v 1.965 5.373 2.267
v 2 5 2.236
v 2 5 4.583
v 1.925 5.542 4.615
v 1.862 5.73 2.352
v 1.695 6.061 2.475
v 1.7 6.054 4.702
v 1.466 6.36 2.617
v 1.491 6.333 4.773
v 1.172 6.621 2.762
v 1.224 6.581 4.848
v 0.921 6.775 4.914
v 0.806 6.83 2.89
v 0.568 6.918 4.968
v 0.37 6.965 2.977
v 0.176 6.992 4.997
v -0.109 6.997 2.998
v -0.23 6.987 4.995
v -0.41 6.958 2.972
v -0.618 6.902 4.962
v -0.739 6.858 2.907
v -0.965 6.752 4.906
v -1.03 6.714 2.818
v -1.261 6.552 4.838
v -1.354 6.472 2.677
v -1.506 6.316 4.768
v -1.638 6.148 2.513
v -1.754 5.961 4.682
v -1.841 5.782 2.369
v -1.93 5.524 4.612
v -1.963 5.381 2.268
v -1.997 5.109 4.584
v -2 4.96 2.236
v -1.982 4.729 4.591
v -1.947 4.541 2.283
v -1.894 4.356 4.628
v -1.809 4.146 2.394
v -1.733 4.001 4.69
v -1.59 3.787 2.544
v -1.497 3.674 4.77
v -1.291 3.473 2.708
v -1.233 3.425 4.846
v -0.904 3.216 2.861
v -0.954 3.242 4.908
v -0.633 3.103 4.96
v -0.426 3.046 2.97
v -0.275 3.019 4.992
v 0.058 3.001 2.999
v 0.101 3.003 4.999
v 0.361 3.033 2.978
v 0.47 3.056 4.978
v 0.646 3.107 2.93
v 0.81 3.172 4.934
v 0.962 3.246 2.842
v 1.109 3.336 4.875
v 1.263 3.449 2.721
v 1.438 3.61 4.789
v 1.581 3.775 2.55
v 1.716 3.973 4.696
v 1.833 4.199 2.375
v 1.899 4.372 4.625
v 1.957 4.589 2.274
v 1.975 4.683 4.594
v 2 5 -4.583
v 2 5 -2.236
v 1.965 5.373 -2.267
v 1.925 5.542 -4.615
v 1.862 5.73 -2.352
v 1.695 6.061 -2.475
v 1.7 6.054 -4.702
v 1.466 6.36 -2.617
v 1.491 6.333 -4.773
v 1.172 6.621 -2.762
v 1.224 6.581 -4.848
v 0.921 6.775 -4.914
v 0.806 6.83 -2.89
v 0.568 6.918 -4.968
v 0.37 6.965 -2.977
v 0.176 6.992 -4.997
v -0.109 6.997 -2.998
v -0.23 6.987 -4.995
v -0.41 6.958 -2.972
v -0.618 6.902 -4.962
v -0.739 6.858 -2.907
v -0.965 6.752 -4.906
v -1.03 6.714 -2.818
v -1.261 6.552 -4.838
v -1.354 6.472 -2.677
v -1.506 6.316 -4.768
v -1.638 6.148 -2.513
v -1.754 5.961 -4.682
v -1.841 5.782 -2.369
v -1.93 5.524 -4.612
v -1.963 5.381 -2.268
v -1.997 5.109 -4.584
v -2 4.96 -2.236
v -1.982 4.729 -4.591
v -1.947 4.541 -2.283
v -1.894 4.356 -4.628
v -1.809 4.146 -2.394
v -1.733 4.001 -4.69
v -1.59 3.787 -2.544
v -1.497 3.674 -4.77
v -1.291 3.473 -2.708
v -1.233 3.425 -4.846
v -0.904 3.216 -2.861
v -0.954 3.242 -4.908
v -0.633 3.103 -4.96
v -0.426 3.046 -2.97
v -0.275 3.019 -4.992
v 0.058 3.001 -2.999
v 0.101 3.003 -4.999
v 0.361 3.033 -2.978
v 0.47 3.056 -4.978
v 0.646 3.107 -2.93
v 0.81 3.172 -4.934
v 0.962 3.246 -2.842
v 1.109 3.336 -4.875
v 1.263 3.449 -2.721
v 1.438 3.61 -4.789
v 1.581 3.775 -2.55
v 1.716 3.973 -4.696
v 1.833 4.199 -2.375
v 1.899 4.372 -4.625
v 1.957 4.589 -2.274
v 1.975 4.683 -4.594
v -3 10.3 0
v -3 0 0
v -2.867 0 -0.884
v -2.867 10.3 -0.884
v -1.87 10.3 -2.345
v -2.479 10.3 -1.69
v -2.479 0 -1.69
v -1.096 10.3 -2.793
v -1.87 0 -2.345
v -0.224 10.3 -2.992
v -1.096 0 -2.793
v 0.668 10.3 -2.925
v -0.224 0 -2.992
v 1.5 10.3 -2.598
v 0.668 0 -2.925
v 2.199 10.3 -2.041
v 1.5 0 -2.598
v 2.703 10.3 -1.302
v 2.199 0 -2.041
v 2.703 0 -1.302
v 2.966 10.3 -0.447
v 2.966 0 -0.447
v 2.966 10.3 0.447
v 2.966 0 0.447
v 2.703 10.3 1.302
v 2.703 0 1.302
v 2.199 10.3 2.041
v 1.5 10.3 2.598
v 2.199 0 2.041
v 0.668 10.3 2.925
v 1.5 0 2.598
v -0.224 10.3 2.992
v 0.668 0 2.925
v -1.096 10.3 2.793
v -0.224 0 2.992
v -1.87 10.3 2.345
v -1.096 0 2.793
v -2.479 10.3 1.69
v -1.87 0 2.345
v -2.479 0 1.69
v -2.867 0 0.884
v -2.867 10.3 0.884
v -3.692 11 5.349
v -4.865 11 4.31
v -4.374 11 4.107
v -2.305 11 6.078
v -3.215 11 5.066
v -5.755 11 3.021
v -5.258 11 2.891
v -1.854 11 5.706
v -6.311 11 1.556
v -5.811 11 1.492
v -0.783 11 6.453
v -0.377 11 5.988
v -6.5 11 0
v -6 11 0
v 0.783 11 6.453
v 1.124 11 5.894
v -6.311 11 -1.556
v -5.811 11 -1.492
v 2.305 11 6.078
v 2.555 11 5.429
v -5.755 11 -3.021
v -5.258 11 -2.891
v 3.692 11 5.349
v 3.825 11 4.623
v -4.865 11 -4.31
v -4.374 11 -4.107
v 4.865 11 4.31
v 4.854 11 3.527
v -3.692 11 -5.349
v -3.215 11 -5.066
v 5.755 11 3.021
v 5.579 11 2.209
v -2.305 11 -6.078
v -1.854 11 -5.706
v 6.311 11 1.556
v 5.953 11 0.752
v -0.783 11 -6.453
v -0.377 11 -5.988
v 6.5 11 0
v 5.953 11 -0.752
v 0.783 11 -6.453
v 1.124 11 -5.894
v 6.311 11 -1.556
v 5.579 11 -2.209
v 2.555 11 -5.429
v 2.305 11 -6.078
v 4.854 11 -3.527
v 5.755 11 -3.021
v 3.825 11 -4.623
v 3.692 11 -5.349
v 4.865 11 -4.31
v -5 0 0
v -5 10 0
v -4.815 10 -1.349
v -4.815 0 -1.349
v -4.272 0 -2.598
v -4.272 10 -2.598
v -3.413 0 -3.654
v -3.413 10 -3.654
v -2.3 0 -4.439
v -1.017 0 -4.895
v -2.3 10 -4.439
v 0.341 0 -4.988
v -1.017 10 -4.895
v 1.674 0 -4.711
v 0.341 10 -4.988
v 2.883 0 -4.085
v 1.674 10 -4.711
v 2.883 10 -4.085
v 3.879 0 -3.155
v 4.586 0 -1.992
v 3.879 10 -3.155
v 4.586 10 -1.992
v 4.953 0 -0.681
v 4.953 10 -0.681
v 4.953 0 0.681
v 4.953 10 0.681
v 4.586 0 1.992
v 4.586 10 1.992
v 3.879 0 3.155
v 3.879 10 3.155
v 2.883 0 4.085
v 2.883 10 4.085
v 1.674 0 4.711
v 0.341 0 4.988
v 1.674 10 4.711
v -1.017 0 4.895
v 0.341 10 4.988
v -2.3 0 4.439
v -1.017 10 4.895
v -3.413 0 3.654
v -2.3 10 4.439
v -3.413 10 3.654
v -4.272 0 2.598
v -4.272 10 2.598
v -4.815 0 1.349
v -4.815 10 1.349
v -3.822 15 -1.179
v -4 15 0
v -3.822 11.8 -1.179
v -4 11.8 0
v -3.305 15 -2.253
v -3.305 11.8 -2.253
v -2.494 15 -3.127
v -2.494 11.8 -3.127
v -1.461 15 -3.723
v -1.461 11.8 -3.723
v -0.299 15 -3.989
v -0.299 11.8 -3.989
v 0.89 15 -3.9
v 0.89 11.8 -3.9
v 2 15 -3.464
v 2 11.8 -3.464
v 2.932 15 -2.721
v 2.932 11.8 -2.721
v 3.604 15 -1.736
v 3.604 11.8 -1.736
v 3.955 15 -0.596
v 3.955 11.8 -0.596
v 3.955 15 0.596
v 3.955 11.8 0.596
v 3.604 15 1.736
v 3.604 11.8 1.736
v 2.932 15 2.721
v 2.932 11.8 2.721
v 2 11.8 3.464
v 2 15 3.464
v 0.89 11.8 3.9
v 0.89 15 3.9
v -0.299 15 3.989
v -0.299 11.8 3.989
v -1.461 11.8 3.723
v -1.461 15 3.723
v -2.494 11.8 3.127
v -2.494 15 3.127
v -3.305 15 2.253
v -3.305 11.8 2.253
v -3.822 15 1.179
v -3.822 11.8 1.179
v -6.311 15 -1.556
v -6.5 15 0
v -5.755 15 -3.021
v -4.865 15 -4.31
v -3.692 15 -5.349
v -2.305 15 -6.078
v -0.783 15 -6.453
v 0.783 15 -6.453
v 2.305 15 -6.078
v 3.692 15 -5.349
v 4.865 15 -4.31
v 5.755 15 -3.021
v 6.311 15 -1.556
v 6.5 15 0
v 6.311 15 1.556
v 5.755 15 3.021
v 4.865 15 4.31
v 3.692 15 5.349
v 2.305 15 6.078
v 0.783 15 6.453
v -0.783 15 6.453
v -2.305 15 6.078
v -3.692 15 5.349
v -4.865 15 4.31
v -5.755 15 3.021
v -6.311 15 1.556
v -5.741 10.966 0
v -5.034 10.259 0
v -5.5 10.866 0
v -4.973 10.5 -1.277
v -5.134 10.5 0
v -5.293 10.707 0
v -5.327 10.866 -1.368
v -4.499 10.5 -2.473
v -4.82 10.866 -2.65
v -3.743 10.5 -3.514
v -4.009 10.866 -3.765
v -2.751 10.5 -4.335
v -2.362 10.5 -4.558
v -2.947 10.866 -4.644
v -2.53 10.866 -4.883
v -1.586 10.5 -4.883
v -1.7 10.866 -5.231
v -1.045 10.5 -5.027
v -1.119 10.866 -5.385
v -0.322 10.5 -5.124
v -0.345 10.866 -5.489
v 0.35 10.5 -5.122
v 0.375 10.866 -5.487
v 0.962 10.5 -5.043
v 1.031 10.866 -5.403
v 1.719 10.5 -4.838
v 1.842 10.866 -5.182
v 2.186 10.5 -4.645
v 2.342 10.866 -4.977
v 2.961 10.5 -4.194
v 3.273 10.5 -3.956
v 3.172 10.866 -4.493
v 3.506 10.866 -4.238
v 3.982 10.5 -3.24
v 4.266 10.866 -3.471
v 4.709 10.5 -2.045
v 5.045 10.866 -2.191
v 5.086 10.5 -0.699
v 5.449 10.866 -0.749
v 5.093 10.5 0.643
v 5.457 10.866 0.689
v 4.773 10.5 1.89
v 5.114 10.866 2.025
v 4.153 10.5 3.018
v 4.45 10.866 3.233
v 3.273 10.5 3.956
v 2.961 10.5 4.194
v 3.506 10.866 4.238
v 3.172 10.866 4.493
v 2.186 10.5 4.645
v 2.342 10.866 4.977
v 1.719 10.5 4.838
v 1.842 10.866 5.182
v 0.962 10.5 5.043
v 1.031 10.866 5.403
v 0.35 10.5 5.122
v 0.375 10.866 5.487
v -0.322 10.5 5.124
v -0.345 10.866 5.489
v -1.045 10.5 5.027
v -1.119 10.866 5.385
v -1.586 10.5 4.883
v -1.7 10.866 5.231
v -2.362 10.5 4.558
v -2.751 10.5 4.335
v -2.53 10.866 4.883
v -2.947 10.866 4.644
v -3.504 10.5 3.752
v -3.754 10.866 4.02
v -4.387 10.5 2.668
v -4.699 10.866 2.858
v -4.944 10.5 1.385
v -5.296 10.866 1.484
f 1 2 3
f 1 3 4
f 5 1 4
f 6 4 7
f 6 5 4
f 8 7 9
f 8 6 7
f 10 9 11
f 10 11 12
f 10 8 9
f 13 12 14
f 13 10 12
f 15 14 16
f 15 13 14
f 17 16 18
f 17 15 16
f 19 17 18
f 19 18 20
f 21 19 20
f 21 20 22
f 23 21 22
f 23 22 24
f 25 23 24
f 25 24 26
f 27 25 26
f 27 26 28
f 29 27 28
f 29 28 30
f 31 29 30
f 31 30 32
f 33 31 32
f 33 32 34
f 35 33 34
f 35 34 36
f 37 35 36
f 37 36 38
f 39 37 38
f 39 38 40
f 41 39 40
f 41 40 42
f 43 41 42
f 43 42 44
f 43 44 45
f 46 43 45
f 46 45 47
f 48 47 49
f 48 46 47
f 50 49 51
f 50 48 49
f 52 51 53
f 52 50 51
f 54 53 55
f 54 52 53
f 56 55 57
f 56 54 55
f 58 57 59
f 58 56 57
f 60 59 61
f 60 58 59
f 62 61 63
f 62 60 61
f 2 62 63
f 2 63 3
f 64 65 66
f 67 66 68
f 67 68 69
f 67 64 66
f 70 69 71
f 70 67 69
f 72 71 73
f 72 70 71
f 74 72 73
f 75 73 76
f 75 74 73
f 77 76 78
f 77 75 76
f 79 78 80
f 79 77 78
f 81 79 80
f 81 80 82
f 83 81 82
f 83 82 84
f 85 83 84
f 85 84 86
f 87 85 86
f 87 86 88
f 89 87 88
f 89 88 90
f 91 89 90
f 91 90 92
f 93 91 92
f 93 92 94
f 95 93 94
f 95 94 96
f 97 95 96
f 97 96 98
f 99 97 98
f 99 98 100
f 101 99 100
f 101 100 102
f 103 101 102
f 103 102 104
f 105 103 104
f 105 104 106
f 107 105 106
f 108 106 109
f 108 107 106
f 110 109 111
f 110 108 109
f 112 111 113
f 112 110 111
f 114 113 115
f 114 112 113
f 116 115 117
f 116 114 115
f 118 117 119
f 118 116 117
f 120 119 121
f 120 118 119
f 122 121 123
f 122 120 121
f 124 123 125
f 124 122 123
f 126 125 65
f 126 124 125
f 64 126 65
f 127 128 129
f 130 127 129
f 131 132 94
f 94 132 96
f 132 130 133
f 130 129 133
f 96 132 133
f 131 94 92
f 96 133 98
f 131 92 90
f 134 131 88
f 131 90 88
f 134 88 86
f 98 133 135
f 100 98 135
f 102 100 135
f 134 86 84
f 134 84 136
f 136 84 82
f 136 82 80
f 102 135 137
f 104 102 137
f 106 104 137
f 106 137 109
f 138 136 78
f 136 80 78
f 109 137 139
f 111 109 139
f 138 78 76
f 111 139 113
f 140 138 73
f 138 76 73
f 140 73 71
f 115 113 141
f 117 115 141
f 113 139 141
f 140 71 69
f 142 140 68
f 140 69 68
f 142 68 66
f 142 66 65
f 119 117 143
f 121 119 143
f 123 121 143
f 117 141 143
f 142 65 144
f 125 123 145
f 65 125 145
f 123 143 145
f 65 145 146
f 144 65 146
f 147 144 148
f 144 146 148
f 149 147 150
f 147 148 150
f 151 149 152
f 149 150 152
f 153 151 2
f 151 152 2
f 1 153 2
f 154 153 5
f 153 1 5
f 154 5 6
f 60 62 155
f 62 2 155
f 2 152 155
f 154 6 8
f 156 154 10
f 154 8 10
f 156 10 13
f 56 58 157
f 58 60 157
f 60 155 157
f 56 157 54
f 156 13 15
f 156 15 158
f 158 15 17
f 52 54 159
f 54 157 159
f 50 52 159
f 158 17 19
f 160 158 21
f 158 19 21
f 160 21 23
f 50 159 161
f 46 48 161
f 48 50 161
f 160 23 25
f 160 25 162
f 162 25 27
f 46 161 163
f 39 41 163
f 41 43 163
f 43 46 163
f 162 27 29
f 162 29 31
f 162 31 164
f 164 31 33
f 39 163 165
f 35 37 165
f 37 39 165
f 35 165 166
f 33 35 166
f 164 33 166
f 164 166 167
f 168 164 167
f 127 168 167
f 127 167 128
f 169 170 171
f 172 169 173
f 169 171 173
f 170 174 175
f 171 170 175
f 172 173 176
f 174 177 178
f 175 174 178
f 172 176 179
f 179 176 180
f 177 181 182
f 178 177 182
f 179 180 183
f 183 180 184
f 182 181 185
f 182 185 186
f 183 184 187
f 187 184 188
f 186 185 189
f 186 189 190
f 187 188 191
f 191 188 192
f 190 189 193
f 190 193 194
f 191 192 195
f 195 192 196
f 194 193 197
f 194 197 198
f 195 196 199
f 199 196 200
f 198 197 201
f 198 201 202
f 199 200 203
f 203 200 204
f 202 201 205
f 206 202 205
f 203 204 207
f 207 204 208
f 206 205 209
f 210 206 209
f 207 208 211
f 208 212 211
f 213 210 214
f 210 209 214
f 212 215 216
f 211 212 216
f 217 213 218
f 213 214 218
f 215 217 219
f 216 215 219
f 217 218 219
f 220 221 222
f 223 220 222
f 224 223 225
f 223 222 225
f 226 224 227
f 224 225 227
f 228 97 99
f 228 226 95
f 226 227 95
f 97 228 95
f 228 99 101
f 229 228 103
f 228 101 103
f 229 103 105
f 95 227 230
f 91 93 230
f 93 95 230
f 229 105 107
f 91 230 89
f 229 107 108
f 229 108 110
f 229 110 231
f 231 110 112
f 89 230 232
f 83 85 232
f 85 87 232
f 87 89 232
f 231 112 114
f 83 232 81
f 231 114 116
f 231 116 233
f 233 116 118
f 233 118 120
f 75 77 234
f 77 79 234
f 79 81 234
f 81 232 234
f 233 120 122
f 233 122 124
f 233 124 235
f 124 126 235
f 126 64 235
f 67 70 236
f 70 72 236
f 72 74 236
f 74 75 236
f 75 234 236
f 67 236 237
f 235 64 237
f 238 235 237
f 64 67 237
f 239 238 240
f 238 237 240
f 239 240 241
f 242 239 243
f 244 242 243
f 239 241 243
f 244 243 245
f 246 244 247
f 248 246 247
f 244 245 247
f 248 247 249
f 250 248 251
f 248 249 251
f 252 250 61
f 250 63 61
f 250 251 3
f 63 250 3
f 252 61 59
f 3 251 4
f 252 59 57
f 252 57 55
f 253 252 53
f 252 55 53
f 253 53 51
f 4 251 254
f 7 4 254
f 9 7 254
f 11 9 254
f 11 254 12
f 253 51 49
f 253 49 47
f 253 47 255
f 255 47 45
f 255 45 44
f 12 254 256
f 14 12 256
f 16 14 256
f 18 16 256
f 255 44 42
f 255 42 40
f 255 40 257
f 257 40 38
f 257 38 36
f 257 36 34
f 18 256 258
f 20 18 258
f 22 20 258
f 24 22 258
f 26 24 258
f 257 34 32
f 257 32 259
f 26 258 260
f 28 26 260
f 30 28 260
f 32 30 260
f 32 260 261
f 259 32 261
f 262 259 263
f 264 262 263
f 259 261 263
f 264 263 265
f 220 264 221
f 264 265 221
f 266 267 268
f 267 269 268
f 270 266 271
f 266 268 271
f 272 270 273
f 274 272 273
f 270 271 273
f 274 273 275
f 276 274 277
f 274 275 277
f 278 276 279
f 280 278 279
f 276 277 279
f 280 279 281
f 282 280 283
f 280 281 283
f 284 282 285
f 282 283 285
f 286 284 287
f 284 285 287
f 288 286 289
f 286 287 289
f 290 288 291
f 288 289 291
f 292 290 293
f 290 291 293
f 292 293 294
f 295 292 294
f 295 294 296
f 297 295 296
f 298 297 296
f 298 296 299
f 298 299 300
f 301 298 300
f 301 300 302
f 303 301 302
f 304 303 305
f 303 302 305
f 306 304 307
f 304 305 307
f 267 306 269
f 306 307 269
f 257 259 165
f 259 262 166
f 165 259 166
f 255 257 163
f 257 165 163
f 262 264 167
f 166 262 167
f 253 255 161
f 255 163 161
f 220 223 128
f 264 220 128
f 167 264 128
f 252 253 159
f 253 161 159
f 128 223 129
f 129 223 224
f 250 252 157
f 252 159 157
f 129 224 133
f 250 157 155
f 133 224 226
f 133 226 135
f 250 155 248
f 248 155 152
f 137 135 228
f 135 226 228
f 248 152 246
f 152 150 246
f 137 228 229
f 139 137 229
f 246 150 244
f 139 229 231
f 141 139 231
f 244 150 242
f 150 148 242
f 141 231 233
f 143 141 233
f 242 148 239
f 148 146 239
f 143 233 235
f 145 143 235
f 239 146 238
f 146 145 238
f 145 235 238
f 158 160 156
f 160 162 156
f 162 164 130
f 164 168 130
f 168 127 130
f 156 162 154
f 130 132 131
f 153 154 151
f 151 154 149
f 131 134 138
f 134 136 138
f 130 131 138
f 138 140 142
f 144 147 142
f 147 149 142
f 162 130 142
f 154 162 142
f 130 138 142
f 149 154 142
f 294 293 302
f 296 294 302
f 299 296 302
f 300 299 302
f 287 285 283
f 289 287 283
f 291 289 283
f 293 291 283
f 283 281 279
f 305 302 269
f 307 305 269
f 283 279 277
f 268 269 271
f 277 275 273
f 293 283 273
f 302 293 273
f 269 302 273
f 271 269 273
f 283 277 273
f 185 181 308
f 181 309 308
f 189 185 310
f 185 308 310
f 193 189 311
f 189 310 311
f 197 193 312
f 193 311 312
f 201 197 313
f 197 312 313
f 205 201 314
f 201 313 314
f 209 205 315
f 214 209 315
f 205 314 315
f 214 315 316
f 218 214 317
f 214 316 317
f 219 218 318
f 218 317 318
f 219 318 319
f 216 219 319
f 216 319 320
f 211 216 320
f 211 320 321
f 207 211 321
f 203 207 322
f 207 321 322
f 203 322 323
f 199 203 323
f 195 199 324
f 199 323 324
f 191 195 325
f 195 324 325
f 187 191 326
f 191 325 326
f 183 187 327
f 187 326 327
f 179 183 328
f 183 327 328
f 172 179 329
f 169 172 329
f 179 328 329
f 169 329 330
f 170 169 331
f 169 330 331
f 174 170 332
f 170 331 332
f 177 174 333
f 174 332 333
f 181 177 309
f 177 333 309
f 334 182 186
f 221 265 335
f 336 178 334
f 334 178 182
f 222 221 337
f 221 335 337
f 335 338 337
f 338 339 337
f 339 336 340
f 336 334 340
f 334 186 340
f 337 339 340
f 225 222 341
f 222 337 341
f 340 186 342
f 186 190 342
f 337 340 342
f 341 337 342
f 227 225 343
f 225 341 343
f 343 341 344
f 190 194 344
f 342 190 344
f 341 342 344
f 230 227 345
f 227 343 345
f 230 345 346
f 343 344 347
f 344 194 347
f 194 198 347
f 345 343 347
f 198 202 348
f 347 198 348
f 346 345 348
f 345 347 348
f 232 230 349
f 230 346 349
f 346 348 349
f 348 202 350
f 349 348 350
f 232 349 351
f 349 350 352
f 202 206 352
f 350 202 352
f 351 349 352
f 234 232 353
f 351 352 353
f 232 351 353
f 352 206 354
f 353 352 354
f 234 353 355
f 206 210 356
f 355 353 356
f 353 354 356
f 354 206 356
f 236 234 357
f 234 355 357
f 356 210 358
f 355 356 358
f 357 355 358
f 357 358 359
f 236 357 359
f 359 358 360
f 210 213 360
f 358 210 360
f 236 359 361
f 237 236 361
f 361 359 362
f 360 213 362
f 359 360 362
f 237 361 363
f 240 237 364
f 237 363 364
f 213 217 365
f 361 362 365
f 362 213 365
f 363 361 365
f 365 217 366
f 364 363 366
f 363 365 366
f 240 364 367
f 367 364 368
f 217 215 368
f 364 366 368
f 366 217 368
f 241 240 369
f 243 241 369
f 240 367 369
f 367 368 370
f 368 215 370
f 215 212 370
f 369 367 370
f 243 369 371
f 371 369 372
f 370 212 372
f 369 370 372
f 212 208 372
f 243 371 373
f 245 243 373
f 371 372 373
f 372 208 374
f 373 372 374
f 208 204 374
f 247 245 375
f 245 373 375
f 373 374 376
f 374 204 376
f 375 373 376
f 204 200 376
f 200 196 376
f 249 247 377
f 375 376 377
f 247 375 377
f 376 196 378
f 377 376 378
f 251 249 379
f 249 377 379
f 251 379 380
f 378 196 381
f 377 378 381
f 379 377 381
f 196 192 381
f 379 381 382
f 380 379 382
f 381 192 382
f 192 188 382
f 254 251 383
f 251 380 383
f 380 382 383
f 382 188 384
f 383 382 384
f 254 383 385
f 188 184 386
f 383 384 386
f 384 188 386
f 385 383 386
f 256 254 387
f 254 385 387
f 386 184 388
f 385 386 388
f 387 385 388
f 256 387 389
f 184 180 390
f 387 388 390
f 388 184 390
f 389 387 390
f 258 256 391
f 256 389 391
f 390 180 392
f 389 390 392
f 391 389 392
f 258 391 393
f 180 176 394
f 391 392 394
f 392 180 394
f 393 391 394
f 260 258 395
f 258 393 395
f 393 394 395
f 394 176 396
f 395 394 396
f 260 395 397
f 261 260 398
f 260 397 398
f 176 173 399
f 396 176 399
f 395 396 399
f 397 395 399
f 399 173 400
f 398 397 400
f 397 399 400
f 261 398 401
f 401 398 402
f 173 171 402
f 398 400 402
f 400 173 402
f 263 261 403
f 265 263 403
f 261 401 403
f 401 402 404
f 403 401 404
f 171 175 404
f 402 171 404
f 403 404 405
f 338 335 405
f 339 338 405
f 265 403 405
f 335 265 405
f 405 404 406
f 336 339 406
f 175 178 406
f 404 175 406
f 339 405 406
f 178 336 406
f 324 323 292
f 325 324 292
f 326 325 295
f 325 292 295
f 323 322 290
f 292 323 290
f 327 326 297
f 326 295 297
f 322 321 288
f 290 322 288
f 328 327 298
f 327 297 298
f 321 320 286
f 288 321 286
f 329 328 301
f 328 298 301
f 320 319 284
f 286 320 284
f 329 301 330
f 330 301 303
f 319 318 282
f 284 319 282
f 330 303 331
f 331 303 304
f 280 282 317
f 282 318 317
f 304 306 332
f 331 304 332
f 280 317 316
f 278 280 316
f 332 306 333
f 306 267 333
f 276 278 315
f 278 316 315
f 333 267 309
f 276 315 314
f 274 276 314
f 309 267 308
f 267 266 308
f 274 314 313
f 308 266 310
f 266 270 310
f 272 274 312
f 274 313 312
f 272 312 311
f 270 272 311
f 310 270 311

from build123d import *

# Parameters (mm, degrees)
CUT_EXTRUDE_1_DEPTH      = 18.592612086
CUT_EXTRUDE_1_DEPTH_BACK = 18.592612086
SKETCH_2_R               = 2


with BuildPart() as part:
    # 草图1 → 旋转1 (revolve)
    with BuildSketch(Plane.XY, mode=Mode.PRIVATE) as revolve_1_sk:
        with BuildLine():
            Line((6.5, 11), (6.5, 15))
            Line((6.5, 15), (4, 15))
            Line((4, 15), (4, 11.8))
            Line((4, 11.8), (0, 11.8))
            Line((0, 11.8), (0, 10.3))
            Line((0, 10.3), (3, 10.3))
            Line((3, 10.3), (3, 0))
            Line((3, 0), (5, 0))
            Line((5, 0), (5, 10))
            ThreePointArc((5, 10), (5.292893219, 10.707106781), (6, 11))
            Line((6, 11), (6.5, 11))
        make_face()
    revolve(revolve_1_sk.sketch.rotate(Axis((0, 11.8, 0), (0, -1, 0)), 180), axis=Axis((0, 11.8, 0), (0, -1, 0)))

    # 草图2 → 切除-拉伸1 (cut, two sides: drawn at the far end of the back side and taken through both)
    with BuildSketch(Plane.XY.offset(-CUT_EXTRUDE_1_DEPTH_BACK)):
        with Locations((0, 5)):
            Circle(SKETCH_2_R)
    extrude(amount=CUT_EXTRUDE_1_DEPTH + CUT_EXTRUDE_1_DEPTH_BACK, mode=Mode.SUBTRACT)


solid = part.part
